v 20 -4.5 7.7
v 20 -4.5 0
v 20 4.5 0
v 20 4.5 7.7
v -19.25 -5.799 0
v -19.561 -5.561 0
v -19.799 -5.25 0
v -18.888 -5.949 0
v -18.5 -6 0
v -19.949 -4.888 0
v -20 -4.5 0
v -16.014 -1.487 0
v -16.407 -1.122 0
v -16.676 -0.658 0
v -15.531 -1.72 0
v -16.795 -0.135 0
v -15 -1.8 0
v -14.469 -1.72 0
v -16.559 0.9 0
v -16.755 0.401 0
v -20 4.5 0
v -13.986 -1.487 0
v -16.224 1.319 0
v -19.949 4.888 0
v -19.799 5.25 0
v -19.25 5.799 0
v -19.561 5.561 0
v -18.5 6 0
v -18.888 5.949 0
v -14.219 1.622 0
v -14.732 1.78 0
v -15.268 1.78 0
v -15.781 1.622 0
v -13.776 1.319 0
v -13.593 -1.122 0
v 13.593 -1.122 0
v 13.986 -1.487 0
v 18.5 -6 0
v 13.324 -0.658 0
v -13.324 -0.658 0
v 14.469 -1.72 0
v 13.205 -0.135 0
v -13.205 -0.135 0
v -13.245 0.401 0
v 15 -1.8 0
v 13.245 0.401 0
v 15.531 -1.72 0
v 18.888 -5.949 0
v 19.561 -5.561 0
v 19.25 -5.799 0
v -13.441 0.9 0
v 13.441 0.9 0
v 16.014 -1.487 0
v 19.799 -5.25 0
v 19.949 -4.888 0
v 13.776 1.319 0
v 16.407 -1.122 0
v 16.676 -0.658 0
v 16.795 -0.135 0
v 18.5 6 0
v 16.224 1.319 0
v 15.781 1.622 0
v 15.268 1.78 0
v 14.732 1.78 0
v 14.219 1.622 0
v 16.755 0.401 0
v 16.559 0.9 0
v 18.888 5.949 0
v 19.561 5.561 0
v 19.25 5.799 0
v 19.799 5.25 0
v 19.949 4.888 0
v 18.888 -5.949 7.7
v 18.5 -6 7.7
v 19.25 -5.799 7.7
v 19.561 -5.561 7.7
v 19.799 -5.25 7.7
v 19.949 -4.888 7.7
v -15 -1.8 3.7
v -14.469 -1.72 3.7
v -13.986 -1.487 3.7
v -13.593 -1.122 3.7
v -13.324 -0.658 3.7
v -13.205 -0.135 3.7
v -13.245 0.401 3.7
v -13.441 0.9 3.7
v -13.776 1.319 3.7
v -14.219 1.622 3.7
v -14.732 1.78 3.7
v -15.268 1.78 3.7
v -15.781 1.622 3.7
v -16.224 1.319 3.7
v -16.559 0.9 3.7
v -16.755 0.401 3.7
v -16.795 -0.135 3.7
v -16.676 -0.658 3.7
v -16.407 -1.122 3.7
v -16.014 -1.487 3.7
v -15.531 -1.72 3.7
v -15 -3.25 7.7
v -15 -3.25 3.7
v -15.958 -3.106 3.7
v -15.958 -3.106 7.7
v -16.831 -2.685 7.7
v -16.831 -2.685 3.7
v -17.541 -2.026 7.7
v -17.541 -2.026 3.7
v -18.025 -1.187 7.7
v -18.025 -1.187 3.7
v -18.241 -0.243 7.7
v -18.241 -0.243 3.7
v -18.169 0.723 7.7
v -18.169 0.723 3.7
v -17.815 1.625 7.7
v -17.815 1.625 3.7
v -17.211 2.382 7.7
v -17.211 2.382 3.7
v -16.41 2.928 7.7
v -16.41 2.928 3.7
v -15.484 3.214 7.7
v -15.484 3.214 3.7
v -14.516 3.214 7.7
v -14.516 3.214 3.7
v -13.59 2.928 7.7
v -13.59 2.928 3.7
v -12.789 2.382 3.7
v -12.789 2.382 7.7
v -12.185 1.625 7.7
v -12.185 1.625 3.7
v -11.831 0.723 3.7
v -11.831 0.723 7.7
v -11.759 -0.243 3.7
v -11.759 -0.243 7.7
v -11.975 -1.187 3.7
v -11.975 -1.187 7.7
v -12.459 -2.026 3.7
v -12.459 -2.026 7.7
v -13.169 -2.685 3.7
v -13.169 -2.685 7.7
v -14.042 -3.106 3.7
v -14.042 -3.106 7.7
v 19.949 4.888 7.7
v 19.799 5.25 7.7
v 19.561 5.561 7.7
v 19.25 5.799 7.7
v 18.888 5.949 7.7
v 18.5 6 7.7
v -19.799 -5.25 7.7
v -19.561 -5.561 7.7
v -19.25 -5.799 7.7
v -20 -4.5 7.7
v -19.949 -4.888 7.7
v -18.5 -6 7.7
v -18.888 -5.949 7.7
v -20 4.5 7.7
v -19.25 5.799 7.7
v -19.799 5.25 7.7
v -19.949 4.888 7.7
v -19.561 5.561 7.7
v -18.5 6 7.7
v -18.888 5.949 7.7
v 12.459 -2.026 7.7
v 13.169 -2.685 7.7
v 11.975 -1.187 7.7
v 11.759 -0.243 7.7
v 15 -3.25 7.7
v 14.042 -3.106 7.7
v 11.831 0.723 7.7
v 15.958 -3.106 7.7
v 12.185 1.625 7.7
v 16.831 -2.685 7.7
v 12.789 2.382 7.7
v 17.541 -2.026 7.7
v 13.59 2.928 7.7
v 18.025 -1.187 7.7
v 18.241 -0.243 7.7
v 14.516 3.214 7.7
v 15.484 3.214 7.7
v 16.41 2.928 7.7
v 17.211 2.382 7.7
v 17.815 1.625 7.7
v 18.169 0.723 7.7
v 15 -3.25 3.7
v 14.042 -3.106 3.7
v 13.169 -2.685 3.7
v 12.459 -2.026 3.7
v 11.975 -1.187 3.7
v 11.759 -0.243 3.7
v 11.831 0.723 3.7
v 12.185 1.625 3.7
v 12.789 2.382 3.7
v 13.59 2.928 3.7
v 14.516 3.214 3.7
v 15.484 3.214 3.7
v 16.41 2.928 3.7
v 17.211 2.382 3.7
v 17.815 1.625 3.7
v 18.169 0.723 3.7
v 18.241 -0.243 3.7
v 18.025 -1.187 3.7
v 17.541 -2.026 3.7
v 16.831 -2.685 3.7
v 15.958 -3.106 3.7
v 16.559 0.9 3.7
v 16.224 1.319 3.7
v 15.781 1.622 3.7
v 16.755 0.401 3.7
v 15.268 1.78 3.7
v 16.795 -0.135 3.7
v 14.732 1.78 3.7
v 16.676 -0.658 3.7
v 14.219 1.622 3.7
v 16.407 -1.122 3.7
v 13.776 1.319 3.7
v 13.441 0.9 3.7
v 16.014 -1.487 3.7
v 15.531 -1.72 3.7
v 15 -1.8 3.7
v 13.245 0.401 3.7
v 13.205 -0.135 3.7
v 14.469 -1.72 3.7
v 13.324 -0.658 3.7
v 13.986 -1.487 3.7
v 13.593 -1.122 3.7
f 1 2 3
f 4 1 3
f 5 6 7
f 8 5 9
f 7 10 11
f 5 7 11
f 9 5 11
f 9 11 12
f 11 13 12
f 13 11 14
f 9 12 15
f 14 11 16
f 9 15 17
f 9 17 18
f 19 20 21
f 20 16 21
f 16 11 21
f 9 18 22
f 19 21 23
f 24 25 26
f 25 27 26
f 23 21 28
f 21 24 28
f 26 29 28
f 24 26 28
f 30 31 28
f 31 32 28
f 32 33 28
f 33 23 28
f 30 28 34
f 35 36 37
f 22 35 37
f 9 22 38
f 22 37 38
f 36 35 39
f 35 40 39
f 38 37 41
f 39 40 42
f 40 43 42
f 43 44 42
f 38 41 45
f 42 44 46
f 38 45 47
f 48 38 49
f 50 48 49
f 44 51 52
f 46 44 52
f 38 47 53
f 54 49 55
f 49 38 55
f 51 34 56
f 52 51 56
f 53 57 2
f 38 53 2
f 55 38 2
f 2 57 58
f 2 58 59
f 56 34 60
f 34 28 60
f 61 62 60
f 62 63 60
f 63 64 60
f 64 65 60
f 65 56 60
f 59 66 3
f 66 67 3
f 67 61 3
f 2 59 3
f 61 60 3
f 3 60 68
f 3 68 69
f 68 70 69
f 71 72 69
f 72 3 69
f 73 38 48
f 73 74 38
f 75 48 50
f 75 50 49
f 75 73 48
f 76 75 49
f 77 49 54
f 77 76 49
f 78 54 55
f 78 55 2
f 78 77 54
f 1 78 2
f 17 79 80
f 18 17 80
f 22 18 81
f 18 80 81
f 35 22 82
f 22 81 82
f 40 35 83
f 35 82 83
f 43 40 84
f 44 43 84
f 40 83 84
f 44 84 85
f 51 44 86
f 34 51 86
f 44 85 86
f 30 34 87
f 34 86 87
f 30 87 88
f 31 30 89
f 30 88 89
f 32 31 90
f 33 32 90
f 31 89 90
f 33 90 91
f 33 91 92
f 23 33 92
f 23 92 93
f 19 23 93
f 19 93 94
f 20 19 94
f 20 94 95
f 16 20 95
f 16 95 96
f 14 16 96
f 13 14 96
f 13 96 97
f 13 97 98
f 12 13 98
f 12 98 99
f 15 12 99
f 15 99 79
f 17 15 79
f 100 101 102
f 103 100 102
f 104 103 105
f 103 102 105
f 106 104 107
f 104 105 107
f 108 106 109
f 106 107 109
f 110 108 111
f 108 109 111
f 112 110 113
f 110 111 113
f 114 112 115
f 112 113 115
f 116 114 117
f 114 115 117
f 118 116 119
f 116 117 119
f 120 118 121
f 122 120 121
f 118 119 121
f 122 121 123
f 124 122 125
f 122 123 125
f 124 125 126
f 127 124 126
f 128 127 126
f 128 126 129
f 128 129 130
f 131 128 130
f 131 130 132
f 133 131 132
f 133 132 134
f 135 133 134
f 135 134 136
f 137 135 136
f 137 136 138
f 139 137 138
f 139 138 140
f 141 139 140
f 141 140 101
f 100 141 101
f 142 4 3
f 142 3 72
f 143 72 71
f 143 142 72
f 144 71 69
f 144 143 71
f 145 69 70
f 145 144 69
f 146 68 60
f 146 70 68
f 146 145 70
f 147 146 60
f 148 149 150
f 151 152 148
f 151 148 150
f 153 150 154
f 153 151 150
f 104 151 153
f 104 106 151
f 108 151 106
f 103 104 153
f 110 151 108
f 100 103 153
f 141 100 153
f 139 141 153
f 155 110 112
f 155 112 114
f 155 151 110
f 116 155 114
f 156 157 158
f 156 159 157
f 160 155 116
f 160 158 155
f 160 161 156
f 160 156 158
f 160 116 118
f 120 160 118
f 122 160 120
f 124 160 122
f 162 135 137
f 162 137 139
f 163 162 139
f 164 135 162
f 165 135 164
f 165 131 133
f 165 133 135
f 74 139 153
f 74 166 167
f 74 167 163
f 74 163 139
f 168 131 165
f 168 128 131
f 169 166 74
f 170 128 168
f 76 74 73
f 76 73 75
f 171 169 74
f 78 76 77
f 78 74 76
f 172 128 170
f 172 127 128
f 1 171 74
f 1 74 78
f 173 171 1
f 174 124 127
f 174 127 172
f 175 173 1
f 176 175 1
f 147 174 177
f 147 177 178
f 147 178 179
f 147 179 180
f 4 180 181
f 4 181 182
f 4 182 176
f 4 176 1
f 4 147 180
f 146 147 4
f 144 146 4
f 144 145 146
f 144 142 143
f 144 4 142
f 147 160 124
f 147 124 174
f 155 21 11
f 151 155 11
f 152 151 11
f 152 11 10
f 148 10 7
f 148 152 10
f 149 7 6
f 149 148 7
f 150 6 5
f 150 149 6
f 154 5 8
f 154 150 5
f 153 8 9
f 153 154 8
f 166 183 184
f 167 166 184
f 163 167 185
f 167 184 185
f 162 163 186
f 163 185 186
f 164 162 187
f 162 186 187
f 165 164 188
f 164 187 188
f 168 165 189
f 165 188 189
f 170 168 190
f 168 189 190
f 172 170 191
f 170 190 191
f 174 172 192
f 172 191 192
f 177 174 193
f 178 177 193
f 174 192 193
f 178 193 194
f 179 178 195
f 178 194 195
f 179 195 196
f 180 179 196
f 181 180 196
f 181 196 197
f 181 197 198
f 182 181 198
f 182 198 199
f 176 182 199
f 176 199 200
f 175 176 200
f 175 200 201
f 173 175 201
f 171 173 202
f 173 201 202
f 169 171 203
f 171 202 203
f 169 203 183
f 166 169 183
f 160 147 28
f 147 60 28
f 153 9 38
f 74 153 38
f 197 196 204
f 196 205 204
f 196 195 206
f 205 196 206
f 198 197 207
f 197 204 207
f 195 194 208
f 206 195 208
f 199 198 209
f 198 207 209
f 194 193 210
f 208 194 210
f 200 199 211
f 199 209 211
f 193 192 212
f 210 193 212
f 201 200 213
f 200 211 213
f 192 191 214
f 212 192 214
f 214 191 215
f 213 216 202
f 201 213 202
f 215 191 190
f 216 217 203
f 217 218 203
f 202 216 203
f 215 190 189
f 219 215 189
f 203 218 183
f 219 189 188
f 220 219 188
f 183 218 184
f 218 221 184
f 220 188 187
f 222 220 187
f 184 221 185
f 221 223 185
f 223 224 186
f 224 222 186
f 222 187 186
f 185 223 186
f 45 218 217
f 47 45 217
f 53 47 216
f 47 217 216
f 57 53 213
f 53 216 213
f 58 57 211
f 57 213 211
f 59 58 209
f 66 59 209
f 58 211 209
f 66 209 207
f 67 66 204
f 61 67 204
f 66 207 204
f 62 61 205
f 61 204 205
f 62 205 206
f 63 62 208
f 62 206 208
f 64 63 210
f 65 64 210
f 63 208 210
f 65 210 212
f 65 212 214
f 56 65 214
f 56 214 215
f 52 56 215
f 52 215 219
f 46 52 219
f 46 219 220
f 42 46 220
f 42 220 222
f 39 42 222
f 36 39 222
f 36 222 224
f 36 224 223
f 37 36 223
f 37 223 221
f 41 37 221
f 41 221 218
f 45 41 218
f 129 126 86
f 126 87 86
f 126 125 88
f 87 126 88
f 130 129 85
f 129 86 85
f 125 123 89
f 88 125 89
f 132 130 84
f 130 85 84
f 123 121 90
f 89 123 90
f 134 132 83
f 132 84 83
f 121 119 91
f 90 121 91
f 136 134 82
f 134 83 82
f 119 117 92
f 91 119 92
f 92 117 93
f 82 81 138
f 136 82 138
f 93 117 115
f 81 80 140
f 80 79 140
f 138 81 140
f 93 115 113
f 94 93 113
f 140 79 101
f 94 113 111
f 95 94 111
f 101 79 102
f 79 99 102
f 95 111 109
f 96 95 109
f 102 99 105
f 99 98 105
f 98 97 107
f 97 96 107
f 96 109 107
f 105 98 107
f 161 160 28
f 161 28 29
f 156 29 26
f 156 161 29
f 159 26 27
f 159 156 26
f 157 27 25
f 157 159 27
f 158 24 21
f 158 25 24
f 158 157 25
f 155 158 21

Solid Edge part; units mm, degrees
sketch "Sketch1" plane through (0, 0, 0) normal (0, 0, 1) x (1, 0, 0)
  line L0 (-20, 6) -> (-20, -6)
  line L1 (-20, -6) -> (20, -6)
  line L2 (20, -6) -> (20, 6)
  line L3 (20, 6) -> (-20, 6)
  dimension "D1" = 40
  dimension "D2" = 20
extrude "Protrusion1" add sketch "Sketch1" along normal blind 7.7
hole "Hole_1" at (15, 0, 7.7) direction (0, 0, -1) diameter 3.6 end through all counterbore diameter 6.5 counterbore depth 4
hole "Hole1" at (-15, 0, 7.7) direction (0, 0, -1) diameter 3.6 end through all counterbore diameter 6.5 counterbore depth 4
fillet "Round_1" radius 1.5 4 edges at (20, 6, 3.85) (20, -6, 3.85) (-20, -6, 3.85) (-20, 6, 3.85)
properties material "Acrylic, high impact grade"
